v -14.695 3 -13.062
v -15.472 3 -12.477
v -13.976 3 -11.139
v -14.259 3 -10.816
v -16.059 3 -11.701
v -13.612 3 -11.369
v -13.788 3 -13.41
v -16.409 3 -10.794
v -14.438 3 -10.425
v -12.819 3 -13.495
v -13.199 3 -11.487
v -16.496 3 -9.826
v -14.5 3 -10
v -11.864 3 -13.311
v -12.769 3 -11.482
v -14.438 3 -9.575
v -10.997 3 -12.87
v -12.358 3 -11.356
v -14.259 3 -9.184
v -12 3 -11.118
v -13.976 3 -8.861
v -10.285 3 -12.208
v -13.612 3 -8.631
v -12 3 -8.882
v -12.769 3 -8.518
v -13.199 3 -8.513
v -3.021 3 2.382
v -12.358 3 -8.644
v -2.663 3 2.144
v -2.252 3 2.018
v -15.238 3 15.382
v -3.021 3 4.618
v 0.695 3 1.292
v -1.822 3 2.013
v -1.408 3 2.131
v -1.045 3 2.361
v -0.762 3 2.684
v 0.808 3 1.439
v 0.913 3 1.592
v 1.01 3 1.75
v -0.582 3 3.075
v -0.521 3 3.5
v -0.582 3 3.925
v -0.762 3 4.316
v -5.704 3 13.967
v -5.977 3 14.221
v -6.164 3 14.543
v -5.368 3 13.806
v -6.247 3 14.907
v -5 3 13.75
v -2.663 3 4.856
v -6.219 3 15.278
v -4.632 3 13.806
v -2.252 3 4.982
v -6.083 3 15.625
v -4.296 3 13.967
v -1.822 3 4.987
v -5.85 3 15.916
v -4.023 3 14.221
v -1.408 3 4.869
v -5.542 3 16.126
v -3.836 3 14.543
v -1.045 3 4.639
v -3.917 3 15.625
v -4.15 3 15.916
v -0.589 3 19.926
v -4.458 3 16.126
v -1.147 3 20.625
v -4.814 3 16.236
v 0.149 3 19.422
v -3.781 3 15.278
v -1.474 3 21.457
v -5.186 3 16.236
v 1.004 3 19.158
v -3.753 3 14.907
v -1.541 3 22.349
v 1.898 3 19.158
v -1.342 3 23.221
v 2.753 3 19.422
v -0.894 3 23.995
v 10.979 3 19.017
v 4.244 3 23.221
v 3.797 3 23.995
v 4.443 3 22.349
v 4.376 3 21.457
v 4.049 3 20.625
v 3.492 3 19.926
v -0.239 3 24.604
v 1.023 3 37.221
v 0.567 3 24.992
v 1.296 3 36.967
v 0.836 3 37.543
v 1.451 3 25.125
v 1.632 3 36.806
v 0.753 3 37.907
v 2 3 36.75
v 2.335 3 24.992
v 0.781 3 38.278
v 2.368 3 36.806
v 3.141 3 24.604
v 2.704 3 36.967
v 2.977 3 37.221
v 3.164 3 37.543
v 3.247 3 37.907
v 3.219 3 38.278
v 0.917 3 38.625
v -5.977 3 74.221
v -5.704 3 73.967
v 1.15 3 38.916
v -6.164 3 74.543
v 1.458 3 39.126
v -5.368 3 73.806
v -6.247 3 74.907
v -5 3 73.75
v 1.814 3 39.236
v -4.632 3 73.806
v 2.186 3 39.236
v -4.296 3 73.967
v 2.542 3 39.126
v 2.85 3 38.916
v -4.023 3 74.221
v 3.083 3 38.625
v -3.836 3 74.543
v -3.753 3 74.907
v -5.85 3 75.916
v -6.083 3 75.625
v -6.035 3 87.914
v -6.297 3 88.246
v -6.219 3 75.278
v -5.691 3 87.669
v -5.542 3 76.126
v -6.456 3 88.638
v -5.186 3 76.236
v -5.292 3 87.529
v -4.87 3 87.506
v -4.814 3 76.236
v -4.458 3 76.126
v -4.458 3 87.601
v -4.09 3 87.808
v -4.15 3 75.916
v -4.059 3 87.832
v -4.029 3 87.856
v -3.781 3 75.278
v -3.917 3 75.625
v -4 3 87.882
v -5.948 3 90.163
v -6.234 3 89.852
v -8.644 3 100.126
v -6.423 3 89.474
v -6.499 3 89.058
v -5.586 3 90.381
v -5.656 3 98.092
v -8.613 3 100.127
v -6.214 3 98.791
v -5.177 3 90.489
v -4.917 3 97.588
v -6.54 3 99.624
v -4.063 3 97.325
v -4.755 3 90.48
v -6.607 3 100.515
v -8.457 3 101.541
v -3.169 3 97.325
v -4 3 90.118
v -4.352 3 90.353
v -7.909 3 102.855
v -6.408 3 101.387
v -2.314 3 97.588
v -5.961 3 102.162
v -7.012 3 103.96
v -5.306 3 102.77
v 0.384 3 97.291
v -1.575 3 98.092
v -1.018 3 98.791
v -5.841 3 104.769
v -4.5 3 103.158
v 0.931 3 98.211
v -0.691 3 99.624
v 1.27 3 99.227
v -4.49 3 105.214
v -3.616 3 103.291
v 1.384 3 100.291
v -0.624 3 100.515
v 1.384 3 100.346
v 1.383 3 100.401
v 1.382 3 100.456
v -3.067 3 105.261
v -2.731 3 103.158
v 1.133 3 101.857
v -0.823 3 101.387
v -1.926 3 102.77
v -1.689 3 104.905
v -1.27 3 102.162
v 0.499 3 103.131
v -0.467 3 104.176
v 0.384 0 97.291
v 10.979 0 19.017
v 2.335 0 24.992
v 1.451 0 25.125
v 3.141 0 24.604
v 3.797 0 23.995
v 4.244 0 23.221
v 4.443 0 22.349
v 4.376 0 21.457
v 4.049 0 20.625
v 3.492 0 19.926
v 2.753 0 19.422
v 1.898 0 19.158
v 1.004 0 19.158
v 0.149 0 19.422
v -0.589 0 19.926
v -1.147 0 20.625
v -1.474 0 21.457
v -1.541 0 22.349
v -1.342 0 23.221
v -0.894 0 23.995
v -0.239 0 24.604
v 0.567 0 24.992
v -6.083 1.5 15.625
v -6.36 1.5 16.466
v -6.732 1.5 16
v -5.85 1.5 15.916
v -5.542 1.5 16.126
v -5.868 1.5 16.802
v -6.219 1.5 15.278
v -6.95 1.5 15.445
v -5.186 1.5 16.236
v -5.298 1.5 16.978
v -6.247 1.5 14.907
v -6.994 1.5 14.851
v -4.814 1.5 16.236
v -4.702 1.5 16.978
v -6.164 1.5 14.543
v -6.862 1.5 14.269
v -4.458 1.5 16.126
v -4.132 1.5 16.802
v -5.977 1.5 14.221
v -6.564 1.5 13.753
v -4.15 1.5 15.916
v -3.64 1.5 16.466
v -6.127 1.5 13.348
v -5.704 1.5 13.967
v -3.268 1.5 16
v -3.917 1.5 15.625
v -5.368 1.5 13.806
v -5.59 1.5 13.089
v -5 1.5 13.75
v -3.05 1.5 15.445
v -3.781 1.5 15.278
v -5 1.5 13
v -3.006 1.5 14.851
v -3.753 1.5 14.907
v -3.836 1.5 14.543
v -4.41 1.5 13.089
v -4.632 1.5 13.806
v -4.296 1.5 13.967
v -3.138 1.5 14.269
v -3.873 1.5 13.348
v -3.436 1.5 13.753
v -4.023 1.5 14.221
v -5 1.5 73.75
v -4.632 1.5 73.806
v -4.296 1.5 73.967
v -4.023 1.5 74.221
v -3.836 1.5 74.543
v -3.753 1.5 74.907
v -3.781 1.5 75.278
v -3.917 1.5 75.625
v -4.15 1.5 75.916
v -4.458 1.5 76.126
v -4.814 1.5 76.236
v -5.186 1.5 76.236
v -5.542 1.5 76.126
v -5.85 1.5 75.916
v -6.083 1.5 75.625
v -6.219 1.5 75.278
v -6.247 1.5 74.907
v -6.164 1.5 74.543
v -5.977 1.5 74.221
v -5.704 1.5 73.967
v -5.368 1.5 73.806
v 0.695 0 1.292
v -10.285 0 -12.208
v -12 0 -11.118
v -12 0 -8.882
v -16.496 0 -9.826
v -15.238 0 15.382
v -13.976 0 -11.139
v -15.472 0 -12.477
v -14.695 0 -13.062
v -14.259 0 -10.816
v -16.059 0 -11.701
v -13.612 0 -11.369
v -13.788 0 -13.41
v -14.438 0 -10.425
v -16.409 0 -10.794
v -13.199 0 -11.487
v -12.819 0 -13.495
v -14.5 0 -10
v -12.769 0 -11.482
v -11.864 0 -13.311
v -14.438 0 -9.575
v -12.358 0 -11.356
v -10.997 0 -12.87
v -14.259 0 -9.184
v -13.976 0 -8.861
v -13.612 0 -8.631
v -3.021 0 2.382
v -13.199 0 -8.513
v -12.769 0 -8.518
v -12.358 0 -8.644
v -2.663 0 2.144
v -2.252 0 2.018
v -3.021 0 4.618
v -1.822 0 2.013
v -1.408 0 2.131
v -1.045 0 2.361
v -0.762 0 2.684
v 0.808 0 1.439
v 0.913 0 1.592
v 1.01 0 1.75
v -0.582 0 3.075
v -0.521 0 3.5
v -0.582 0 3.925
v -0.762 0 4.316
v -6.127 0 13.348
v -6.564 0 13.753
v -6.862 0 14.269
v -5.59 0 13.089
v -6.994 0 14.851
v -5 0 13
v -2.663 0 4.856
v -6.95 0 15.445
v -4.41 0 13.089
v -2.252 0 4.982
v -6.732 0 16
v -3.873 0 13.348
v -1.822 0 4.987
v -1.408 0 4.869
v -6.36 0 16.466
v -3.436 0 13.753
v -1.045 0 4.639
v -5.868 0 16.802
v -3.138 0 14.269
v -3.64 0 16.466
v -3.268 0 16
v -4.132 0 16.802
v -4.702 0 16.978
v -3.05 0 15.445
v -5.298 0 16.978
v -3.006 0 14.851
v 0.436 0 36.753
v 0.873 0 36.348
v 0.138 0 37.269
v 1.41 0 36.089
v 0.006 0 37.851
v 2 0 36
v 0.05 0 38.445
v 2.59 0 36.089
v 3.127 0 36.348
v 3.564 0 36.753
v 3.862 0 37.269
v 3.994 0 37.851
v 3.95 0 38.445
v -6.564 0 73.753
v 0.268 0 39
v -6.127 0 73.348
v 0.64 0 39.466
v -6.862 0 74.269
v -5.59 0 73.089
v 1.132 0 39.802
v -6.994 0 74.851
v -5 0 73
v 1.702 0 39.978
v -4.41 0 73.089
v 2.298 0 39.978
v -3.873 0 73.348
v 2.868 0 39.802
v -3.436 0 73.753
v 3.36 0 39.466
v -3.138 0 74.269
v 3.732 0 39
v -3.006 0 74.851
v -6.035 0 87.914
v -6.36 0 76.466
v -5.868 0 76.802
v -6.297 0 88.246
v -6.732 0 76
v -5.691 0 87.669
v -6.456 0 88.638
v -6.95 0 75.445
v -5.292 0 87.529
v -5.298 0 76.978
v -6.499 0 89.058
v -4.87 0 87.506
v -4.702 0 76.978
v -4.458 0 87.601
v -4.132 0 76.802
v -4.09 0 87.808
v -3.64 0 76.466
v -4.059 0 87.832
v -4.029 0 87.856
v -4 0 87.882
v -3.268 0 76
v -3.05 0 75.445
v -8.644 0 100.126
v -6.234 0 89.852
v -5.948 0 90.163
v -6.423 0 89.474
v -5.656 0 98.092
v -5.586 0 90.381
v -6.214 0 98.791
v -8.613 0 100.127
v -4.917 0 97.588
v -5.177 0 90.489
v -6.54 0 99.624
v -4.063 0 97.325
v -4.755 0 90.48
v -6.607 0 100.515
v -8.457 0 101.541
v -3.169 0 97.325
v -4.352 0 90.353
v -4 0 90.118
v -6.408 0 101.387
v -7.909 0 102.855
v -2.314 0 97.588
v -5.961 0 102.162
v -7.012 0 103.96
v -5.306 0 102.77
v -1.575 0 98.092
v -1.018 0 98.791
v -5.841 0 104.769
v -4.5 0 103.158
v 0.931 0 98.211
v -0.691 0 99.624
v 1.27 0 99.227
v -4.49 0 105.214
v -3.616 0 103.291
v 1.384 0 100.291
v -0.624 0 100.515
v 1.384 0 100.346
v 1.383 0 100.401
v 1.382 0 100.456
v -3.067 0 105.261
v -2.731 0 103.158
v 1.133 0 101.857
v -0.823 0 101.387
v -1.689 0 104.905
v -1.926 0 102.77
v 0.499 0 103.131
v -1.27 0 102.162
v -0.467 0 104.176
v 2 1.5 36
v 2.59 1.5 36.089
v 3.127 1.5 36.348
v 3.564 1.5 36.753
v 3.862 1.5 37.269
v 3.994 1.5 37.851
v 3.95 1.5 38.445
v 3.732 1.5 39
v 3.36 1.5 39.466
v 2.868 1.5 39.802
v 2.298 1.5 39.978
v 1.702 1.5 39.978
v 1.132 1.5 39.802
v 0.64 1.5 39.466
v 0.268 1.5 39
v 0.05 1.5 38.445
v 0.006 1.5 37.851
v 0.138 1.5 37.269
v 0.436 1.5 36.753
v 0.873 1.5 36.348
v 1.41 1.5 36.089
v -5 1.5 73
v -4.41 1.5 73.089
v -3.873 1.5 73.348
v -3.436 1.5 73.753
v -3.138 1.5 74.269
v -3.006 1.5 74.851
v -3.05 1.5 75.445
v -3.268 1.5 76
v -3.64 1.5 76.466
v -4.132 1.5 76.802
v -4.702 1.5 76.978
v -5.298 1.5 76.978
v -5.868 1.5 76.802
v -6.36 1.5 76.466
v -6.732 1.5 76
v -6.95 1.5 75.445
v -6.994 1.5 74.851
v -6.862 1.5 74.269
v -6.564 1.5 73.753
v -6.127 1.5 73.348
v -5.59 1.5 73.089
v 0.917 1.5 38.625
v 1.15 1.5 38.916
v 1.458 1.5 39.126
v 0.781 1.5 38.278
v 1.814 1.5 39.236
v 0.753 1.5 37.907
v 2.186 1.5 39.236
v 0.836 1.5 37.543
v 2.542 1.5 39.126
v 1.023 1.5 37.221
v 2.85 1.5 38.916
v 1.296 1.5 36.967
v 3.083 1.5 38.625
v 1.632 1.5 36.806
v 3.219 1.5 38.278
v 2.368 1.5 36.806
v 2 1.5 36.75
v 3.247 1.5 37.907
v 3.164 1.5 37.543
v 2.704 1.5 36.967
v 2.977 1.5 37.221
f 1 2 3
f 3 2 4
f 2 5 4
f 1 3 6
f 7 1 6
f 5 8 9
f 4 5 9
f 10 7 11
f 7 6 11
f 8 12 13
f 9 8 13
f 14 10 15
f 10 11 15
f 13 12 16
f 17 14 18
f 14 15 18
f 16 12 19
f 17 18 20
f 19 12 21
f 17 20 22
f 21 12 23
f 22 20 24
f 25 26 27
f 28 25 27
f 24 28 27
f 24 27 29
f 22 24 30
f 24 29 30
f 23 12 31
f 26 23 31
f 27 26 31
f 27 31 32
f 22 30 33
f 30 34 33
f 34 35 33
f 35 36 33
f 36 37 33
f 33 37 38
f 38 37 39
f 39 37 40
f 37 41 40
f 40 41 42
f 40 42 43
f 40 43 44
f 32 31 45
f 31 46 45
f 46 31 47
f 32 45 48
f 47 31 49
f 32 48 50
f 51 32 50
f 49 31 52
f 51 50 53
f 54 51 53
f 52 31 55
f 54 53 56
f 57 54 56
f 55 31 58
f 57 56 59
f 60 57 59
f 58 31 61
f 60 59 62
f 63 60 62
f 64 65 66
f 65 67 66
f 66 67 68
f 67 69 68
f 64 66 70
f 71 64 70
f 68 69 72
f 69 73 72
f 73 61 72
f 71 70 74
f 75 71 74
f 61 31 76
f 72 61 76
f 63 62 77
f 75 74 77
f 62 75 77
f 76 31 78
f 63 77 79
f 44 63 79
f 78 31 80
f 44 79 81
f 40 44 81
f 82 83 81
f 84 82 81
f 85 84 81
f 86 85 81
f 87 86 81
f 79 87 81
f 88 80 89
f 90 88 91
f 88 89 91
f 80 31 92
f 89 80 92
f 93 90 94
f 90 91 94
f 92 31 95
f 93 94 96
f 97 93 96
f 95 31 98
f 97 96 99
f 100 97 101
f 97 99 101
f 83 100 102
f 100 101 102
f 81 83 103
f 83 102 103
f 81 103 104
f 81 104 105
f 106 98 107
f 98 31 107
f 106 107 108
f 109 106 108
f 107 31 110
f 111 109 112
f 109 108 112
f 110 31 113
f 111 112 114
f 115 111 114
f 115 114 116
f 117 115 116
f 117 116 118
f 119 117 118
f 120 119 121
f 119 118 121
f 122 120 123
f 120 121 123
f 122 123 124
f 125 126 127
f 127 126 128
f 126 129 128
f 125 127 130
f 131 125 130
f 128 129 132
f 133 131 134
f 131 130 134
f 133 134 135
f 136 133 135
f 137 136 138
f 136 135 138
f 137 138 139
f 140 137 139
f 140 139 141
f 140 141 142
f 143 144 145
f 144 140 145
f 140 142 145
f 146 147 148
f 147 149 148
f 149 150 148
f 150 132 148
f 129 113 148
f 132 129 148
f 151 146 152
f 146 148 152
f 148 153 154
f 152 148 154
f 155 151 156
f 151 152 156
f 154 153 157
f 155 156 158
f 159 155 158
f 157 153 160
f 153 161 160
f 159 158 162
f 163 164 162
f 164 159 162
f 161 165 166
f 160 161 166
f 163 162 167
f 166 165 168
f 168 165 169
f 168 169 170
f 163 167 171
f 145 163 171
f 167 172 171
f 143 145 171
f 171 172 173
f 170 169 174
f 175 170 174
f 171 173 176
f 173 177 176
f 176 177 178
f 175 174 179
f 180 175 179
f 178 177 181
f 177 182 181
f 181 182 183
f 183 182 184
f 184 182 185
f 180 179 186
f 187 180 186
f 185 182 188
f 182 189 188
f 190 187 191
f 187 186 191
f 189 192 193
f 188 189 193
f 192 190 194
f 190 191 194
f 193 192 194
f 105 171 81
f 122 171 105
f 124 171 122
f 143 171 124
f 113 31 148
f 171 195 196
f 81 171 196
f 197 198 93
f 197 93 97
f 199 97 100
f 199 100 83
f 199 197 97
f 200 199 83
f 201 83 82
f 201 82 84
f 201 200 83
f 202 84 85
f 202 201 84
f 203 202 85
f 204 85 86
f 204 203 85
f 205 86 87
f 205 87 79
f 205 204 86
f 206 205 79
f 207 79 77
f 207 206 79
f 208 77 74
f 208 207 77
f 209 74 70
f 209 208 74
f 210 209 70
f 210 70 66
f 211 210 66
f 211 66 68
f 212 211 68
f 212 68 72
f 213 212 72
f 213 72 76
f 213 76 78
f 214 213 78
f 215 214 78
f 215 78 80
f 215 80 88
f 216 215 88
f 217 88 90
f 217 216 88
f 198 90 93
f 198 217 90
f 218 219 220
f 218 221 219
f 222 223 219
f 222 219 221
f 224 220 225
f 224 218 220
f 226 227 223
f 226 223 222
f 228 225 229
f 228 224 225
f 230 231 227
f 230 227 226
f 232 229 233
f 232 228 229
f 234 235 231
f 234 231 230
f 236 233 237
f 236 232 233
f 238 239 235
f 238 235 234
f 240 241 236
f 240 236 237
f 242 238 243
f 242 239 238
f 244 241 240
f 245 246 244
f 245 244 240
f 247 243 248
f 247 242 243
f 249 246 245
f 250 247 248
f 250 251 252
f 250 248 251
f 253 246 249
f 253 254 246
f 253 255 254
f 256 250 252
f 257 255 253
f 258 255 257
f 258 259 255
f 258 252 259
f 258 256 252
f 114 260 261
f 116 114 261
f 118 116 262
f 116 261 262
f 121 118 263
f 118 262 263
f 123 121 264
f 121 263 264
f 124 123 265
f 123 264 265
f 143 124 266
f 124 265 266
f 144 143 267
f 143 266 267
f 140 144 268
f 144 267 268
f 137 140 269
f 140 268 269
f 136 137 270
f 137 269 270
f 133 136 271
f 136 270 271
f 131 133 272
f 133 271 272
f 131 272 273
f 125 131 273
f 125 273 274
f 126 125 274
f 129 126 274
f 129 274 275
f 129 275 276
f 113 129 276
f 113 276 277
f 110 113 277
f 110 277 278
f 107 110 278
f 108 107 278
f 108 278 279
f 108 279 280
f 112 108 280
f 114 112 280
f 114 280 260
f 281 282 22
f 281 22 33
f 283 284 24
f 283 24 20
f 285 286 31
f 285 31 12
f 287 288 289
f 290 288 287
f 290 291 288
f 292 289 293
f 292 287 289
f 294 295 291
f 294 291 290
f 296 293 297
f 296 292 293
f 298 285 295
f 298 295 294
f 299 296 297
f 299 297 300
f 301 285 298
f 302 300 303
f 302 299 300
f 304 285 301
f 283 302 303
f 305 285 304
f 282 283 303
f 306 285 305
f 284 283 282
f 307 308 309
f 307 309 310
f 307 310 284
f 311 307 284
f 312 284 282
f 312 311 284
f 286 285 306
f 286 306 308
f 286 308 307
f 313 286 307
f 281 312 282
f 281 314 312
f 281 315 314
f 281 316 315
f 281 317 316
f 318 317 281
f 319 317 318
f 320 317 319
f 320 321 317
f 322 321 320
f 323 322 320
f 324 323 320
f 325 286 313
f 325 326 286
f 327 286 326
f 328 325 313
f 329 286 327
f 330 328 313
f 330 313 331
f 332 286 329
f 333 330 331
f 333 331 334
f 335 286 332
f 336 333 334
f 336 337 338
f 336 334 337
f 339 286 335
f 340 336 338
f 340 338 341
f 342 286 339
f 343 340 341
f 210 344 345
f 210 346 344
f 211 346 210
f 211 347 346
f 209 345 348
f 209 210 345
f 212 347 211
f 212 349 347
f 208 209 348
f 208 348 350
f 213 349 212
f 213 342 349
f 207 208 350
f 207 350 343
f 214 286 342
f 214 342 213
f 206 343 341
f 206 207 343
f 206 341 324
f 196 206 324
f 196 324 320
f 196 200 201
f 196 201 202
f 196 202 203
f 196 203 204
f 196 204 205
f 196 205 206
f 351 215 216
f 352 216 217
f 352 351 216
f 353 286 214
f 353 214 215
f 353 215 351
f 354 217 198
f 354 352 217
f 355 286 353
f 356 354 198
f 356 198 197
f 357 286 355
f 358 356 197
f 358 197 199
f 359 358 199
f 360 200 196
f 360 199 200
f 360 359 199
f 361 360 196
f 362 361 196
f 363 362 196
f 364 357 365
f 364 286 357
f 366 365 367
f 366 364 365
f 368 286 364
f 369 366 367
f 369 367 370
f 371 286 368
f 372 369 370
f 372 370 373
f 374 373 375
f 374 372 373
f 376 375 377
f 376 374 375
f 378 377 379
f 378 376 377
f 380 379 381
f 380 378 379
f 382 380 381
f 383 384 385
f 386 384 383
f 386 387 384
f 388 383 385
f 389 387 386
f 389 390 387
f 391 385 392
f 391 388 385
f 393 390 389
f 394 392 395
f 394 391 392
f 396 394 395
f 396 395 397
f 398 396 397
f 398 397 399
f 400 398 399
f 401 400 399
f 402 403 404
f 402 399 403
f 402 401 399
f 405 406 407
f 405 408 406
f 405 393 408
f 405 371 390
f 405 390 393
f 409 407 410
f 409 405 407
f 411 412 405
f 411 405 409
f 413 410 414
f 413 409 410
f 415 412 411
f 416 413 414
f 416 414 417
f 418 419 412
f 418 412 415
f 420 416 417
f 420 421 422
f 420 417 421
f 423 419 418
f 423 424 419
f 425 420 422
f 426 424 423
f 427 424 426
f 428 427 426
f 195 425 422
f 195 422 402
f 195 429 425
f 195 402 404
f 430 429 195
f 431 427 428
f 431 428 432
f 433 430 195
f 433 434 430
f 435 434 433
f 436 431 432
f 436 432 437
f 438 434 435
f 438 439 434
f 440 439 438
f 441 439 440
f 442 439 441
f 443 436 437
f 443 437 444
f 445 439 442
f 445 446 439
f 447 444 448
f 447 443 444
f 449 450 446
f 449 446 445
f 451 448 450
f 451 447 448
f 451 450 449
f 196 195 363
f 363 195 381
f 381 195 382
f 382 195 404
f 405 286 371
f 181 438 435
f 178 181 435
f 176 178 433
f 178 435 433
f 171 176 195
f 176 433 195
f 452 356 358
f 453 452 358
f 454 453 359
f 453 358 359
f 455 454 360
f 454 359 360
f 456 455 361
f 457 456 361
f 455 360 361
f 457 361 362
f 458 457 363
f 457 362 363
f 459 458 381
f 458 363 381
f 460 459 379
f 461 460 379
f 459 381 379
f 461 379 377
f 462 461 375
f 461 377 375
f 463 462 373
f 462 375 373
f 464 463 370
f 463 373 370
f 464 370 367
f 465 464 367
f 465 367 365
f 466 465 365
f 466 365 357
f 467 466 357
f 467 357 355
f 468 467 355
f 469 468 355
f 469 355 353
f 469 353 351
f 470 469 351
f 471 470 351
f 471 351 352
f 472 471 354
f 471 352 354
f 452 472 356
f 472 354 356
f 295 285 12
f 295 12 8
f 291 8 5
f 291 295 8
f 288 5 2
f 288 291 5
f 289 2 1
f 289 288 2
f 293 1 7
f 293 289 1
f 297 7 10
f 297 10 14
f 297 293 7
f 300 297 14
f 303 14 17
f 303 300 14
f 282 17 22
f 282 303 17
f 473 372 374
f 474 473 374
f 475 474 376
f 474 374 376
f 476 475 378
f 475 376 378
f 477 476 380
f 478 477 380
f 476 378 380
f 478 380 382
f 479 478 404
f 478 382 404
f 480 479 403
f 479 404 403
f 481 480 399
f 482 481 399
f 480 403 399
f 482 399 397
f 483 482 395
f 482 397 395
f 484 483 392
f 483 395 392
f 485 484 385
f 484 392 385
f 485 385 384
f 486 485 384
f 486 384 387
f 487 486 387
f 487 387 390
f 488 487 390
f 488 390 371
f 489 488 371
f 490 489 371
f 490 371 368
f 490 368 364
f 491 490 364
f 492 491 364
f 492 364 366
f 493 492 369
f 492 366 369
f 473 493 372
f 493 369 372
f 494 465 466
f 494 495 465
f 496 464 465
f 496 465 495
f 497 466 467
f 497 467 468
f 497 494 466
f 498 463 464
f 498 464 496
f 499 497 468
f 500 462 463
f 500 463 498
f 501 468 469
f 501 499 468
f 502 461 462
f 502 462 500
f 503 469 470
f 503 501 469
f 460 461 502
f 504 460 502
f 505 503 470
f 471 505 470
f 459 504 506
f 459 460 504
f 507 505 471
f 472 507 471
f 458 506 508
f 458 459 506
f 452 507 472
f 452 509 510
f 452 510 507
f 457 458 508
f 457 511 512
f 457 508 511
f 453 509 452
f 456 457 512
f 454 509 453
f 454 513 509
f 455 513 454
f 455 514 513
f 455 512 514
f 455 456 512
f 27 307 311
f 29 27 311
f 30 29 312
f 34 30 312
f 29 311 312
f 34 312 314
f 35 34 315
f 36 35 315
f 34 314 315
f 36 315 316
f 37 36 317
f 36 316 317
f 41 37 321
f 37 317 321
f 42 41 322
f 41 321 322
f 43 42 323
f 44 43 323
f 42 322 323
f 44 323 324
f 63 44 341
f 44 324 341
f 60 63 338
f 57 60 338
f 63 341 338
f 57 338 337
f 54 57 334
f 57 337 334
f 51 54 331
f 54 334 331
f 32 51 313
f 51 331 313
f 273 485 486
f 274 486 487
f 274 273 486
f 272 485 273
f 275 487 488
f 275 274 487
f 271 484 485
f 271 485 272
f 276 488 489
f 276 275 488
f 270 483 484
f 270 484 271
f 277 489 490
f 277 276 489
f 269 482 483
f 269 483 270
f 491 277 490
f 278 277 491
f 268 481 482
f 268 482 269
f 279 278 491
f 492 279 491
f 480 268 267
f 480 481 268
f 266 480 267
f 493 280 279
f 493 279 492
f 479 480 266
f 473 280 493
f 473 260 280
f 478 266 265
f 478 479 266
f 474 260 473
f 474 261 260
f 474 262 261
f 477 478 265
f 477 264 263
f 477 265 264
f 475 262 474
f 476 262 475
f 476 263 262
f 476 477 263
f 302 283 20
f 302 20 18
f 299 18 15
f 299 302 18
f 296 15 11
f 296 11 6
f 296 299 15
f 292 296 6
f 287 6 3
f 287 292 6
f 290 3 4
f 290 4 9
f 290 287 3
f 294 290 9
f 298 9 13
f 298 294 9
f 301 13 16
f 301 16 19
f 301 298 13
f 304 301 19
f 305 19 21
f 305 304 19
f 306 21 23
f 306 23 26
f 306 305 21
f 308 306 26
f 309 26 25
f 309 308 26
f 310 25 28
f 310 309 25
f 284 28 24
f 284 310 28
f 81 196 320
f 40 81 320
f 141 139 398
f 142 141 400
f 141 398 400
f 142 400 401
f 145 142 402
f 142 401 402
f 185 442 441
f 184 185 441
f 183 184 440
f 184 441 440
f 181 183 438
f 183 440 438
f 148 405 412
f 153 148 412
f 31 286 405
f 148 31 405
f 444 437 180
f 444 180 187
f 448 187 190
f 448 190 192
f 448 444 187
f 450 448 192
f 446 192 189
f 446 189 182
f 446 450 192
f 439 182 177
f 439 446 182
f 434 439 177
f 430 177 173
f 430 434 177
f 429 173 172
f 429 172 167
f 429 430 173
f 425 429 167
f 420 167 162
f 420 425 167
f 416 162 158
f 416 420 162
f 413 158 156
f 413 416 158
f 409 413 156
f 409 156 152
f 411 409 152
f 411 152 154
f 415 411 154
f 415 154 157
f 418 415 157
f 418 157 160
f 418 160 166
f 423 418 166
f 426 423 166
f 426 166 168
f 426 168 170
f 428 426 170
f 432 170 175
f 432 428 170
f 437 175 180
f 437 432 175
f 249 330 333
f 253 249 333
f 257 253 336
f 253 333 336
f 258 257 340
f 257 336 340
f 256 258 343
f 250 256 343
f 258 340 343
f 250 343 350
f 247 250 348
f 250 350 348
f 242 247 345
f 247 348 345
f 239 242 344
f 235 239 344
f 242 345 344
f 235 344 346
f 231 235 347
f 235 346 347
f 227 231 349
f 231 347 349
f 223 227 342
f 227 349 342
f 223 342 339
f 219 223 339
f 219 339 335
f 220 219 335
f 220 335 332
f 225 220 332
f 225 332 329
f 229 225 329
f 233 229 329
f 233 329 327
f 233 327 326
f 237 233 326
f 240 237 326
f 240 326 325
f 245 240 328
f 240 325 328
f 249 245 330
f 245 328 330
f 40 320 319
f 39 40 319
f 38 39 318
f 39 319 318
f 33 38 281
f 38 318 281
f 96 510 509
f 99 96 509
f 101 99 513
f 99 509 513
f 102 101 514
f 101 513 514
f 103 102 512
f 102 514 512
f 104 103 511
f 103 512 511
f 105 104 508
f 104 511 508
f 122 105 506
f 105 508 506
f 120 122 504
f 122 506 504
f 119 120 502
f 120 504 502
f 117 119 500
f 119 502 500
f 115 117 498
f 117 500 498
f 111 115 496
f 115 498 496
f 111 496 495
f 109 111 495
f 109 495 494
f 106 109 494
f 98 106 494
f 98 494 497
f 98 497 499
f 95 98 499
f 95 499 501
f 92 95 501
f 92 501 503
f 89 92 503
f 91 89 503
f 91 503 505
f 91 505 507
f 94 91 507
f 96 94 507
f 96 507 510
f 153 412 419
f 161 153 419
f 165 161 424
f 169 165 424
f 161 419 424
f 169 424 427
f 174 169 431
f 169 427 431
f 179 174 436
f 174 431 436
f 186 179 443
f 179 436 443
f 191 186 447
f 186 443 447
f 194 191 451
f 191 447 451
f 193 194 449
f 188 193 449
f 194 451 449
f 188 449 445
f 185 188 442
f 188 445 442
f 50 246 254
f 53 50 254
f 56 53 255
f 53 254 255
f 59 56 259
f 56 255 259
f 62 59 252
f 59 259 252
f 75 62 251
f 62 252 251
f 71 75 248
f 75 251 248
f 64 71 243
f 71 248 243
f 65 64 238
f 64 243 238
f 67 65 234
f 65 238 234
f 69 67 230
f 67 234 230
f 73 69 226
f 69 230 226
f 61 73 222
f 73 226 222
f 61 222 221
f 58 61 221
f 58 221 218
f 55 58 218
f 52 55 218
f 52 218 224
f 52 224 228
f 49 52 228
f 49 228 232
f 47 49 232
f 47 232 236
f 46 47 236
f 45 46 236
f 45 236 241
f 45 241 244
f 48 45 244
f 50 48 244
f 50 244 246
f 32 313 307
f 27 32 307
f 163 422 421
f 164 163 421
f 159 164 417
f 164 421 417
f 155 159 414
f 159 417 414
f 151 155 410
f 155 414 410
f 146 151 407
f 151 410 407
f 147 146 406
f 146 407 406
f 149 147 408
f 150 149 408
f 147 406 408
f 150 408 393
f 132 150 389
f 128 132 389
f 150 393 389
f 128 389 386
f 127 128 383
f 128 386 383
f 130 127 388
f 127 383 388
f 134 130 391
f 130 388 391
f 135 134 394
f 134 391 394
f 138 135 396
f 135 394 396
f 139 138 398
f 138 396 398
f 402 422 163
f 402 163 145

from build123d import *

# Parameters (mm, degrees)
SKETCH_2_R          = 3
EXTRUDE_1_DEPTH     = 3
SKETCH_3_R          = 3.5
EXTRUDE_2_DEPTH     = 3
SKETCH_4_R          = 3.5
EXTRUDE_3_DEPTH     = 3
CUT_EXTRUDE_1_DEPTH = 107.618473768
CUT_EXTRUDE_2_DEPTH = 107.618473768
EXTRUDE_4_DEPTH     = 3
SKETCH_6_R          = 1.25
CUT_EXTRUDE_3_DEPTH = 107.618473768
SKETCH_6_3_R        = 2
SKETCH_6_3_R_2      = 1.25
CUT_EXTRUDE_4_DEPTH = 1.5


with BuildPart() as part:
    # 草图2 → 凸台-拉伸1 (new body)
    with BuildSketch(Plane(origin=(0, 0, 0), x_dir=(1, 0, 0), z_dir=(0, 1, 0))):
        with BuildLine():
            Line((-8, 0), (-15.238247957, -15.382059892))
            Line((-15.238247957, -15.382059892), (-8.643699882, -100.125861646))
            Line((-8.643699882, -100.125861646), (-8.61301011, -100.126871188))
            ThreePointArc((-8.61301011, -100.126871188), (-3.780099648, -105.28855468), (1.381583844, -100.455644218))
            Line((1.381583844, -100.455644218), (1.399355455, -100.456228817))
            Line((1.399355455, -100.456228817), (10.979274058, -19.016660498))
            Line((10.979274058, -19.016660498), (1.010362938, -1.749999943))
            ThreePointArc((1.010362938, -1.749999943), (-0.270725971, -0.46891107), (-2.020725942, 0))
            Line((-2.020725942, 0), (-8, 0))
        make_face()
        with Locations(Location((-3.615713133, -100.291257703, 0), (0, 0, 270))):
            Circle(SKETCH_2_R, mode=Mode.SUBTRACT)
        with BuildLine():
            ThreePointArc((-3.020725942, -2.381966011), (-0.520725942, -3.5), (-3.020725942, -4.618033989))
            Line((-3.020725942, -4.618033989), (-3.020725942, -2.381966011))
        make_face(mode=Mode.SUBTRACT)
        with Locations(Location((1.451061426, -22.124978573, 0), (0, 0, 270))):
            Circle(SKETCH_2_R, mode=Mode.SUBTRACT)
    extrude(amount=EXTRUDE_1_DEPTH)

    # 草图4 → 凸台-拉伸3 (add)
    with BuildSketch(Plane.XZ):
        with Locations((-5, 89)):
            Circle(SKETCH_4_R)
    extrude(amount=-EXTRUDE_3_DEPTH)

    # 草图4<3> → 切除-拉伸1 (cut, through all)
    with BuildSketch(Plane.XZ):
        with BuildLine():
            ThreePointArc((-3.5, 89), (-3.60795306, 89.55875336), (-3.916273757, 90.037081207))
            Line((-3.916273757, 90.037081207), (-4.089754437, 87.807752956))
            ThreePointArc((-4.089754437, 87.807752956), (-3.655498541, 88.334931712), (-3.5, 89))
        make_face()
        with BuildLine():
            Line((-4.089754437, 87.807752956), (-3.916273757, 90.037081207))
            ThreePointArc((-3.916273757, 90.037081207), (-6.495478854, 89.116374378), (-4.089754437, 87.807752956))
        make_face()
    extrude(amount=-CUT_EXTRUDE_1_DEPTH, mode=Mode.SUBTRACT)

    # 草图4<4> → 切除-拉伸2 (cut, through all)
    with BuildSketch(Plane.XZ):
        with BuildLine():
            ThreePointArc((1.384286867, 100.291257703), (1.127703357, 98.710118873), (0.384286867, 97.291257703))
            Line((0.384286867, 97.291257703), (10.979274058, 19.016660498))
            Line((10.979274058, 19.016660498), (1.399355455, 100.456228817))
            Line((1.399355455, 100.456228817), (1.381583844, 100.455644218))
            ThreePointArc((1.381583844, 100.455644218), (1.383611066, 100.373462071), (1.384286867, 100.291257703))
        make_face()
    extrude(amount=-CUT_EXTRUDE_2_DEPTH, mode=Mode.SUBTRACT)



with BuildPart() as body_2:
    # 草图3 → 凸台-拉伸2 (new body)
    with BuildSketch(Plane.XZ):
        with Locations(Location((-13, -10, 0), (0, 0, 270))):
            Circle(SKETCH_3_R)
        with BuildLine():
            Line((-12, -8.881966011), (-12, -11.118033989))
            ThreePointArc((-12, -11.118033989), (-14.5, -10), (-12, -8.881966011))
        make_face(mode=Mode.SUBTRACT)
    extrude(amount=-EXTRUDE_2_DEPTH)


with BuildPart() as part_1:
    add(part.part)

    add(body_2.part)  # 凸台-拉伸4 merges body 2
    # 草图5 → 凸台-拉伸4 (add)
    with BuildSketch(Plane.XZ):
        with BuildLine():
            Line((-10.28463728, -12.208348998), (0.694636778, 1.291651002))
            Line((0.694636778, 1.291651002), (-8, 0))
            Line((-8, 0), (-15.238247957, 15.382059892))
            Line((-15.238247957, 15.382059892), (-16.495653764, -9.825630381))
            ThreePointArc((-16.495653764, -9.825630381), (-11.746385015, -6.732210308), (-10.28463728, -12.208348998))
        make_face()
        with BuildLine():
            Line((-4, 90.118033989), (-4, 87.881966011))
            ThreePointArc((-4, 87.881966011), (-3.5, 89), (-4, 90.118033989))
        make_face()
    extrude(amount=-EXTRUDE_4_DEPTH)

    # 草图6 → 切除-拉伸3 (cut, through all)
    with BuildSketch(Plane.XZ):
        with Locations(Location((-5, 15, 0), (0, 0, 270))):
            Circle(SKETCH_6_R)
        with Locations(Location((2, 38, 0), (0, 0, 270))):
            Circle(SKETCH_6_R)
        with Locations(Location((-5, 75, 0), (0, 0, 270))):
            Circle(SKETCH_6_R)
    extrude(amount=-CUT_EXTRUDE_3_DEPTH, mode=Mode.SUBTRACT)

    # 草图6<3> → 切除-拉伸4 (cut)
    # profile 1 of 3: a face of its own
    with BuildSketch(Plane.XZ):
        with Locations(Location((-5, 15, 0), (0, 0, 270))):
            Circle(SKETCH_6_3_R)
        with Locations(Location((-5, 15, 0), (0, 0, 270))):
            Circle(SKETCH_6_3_R_2, mode=Mode.SUBTRACT)
    # profile 2 of 3: a face of its own
    with BuildSketch(Plane.XZ):
        with Locations(Location((2, 38, 0), (0, 0, 270))):
            Circle(SKETCH_6_3_R)
        with Locations(Location((2, 38, 0), (0, 0, 270))):
            Circle(SKETCH_6_3_R_2, mode=Mode.SUBTRACT)
    # profile 3 of 3: a face of its own
    with BuildSketch(Plane.XZ):
        with Locations(Location((-5, 75, 0), (0, 0, 270))):
            Circle(SKETCH_6_3_R)
        with Locations(Location((-5, 75, 0), (0, 0, 270))):
            Circle(SKETCH_6_3_R_2, mode=Mode.SUBTRACT)
    extrude(amount=-CUT_EXTRUDE_4_DEPTH, mode=Mode.SUBTRACT)


solid = part_1.part
